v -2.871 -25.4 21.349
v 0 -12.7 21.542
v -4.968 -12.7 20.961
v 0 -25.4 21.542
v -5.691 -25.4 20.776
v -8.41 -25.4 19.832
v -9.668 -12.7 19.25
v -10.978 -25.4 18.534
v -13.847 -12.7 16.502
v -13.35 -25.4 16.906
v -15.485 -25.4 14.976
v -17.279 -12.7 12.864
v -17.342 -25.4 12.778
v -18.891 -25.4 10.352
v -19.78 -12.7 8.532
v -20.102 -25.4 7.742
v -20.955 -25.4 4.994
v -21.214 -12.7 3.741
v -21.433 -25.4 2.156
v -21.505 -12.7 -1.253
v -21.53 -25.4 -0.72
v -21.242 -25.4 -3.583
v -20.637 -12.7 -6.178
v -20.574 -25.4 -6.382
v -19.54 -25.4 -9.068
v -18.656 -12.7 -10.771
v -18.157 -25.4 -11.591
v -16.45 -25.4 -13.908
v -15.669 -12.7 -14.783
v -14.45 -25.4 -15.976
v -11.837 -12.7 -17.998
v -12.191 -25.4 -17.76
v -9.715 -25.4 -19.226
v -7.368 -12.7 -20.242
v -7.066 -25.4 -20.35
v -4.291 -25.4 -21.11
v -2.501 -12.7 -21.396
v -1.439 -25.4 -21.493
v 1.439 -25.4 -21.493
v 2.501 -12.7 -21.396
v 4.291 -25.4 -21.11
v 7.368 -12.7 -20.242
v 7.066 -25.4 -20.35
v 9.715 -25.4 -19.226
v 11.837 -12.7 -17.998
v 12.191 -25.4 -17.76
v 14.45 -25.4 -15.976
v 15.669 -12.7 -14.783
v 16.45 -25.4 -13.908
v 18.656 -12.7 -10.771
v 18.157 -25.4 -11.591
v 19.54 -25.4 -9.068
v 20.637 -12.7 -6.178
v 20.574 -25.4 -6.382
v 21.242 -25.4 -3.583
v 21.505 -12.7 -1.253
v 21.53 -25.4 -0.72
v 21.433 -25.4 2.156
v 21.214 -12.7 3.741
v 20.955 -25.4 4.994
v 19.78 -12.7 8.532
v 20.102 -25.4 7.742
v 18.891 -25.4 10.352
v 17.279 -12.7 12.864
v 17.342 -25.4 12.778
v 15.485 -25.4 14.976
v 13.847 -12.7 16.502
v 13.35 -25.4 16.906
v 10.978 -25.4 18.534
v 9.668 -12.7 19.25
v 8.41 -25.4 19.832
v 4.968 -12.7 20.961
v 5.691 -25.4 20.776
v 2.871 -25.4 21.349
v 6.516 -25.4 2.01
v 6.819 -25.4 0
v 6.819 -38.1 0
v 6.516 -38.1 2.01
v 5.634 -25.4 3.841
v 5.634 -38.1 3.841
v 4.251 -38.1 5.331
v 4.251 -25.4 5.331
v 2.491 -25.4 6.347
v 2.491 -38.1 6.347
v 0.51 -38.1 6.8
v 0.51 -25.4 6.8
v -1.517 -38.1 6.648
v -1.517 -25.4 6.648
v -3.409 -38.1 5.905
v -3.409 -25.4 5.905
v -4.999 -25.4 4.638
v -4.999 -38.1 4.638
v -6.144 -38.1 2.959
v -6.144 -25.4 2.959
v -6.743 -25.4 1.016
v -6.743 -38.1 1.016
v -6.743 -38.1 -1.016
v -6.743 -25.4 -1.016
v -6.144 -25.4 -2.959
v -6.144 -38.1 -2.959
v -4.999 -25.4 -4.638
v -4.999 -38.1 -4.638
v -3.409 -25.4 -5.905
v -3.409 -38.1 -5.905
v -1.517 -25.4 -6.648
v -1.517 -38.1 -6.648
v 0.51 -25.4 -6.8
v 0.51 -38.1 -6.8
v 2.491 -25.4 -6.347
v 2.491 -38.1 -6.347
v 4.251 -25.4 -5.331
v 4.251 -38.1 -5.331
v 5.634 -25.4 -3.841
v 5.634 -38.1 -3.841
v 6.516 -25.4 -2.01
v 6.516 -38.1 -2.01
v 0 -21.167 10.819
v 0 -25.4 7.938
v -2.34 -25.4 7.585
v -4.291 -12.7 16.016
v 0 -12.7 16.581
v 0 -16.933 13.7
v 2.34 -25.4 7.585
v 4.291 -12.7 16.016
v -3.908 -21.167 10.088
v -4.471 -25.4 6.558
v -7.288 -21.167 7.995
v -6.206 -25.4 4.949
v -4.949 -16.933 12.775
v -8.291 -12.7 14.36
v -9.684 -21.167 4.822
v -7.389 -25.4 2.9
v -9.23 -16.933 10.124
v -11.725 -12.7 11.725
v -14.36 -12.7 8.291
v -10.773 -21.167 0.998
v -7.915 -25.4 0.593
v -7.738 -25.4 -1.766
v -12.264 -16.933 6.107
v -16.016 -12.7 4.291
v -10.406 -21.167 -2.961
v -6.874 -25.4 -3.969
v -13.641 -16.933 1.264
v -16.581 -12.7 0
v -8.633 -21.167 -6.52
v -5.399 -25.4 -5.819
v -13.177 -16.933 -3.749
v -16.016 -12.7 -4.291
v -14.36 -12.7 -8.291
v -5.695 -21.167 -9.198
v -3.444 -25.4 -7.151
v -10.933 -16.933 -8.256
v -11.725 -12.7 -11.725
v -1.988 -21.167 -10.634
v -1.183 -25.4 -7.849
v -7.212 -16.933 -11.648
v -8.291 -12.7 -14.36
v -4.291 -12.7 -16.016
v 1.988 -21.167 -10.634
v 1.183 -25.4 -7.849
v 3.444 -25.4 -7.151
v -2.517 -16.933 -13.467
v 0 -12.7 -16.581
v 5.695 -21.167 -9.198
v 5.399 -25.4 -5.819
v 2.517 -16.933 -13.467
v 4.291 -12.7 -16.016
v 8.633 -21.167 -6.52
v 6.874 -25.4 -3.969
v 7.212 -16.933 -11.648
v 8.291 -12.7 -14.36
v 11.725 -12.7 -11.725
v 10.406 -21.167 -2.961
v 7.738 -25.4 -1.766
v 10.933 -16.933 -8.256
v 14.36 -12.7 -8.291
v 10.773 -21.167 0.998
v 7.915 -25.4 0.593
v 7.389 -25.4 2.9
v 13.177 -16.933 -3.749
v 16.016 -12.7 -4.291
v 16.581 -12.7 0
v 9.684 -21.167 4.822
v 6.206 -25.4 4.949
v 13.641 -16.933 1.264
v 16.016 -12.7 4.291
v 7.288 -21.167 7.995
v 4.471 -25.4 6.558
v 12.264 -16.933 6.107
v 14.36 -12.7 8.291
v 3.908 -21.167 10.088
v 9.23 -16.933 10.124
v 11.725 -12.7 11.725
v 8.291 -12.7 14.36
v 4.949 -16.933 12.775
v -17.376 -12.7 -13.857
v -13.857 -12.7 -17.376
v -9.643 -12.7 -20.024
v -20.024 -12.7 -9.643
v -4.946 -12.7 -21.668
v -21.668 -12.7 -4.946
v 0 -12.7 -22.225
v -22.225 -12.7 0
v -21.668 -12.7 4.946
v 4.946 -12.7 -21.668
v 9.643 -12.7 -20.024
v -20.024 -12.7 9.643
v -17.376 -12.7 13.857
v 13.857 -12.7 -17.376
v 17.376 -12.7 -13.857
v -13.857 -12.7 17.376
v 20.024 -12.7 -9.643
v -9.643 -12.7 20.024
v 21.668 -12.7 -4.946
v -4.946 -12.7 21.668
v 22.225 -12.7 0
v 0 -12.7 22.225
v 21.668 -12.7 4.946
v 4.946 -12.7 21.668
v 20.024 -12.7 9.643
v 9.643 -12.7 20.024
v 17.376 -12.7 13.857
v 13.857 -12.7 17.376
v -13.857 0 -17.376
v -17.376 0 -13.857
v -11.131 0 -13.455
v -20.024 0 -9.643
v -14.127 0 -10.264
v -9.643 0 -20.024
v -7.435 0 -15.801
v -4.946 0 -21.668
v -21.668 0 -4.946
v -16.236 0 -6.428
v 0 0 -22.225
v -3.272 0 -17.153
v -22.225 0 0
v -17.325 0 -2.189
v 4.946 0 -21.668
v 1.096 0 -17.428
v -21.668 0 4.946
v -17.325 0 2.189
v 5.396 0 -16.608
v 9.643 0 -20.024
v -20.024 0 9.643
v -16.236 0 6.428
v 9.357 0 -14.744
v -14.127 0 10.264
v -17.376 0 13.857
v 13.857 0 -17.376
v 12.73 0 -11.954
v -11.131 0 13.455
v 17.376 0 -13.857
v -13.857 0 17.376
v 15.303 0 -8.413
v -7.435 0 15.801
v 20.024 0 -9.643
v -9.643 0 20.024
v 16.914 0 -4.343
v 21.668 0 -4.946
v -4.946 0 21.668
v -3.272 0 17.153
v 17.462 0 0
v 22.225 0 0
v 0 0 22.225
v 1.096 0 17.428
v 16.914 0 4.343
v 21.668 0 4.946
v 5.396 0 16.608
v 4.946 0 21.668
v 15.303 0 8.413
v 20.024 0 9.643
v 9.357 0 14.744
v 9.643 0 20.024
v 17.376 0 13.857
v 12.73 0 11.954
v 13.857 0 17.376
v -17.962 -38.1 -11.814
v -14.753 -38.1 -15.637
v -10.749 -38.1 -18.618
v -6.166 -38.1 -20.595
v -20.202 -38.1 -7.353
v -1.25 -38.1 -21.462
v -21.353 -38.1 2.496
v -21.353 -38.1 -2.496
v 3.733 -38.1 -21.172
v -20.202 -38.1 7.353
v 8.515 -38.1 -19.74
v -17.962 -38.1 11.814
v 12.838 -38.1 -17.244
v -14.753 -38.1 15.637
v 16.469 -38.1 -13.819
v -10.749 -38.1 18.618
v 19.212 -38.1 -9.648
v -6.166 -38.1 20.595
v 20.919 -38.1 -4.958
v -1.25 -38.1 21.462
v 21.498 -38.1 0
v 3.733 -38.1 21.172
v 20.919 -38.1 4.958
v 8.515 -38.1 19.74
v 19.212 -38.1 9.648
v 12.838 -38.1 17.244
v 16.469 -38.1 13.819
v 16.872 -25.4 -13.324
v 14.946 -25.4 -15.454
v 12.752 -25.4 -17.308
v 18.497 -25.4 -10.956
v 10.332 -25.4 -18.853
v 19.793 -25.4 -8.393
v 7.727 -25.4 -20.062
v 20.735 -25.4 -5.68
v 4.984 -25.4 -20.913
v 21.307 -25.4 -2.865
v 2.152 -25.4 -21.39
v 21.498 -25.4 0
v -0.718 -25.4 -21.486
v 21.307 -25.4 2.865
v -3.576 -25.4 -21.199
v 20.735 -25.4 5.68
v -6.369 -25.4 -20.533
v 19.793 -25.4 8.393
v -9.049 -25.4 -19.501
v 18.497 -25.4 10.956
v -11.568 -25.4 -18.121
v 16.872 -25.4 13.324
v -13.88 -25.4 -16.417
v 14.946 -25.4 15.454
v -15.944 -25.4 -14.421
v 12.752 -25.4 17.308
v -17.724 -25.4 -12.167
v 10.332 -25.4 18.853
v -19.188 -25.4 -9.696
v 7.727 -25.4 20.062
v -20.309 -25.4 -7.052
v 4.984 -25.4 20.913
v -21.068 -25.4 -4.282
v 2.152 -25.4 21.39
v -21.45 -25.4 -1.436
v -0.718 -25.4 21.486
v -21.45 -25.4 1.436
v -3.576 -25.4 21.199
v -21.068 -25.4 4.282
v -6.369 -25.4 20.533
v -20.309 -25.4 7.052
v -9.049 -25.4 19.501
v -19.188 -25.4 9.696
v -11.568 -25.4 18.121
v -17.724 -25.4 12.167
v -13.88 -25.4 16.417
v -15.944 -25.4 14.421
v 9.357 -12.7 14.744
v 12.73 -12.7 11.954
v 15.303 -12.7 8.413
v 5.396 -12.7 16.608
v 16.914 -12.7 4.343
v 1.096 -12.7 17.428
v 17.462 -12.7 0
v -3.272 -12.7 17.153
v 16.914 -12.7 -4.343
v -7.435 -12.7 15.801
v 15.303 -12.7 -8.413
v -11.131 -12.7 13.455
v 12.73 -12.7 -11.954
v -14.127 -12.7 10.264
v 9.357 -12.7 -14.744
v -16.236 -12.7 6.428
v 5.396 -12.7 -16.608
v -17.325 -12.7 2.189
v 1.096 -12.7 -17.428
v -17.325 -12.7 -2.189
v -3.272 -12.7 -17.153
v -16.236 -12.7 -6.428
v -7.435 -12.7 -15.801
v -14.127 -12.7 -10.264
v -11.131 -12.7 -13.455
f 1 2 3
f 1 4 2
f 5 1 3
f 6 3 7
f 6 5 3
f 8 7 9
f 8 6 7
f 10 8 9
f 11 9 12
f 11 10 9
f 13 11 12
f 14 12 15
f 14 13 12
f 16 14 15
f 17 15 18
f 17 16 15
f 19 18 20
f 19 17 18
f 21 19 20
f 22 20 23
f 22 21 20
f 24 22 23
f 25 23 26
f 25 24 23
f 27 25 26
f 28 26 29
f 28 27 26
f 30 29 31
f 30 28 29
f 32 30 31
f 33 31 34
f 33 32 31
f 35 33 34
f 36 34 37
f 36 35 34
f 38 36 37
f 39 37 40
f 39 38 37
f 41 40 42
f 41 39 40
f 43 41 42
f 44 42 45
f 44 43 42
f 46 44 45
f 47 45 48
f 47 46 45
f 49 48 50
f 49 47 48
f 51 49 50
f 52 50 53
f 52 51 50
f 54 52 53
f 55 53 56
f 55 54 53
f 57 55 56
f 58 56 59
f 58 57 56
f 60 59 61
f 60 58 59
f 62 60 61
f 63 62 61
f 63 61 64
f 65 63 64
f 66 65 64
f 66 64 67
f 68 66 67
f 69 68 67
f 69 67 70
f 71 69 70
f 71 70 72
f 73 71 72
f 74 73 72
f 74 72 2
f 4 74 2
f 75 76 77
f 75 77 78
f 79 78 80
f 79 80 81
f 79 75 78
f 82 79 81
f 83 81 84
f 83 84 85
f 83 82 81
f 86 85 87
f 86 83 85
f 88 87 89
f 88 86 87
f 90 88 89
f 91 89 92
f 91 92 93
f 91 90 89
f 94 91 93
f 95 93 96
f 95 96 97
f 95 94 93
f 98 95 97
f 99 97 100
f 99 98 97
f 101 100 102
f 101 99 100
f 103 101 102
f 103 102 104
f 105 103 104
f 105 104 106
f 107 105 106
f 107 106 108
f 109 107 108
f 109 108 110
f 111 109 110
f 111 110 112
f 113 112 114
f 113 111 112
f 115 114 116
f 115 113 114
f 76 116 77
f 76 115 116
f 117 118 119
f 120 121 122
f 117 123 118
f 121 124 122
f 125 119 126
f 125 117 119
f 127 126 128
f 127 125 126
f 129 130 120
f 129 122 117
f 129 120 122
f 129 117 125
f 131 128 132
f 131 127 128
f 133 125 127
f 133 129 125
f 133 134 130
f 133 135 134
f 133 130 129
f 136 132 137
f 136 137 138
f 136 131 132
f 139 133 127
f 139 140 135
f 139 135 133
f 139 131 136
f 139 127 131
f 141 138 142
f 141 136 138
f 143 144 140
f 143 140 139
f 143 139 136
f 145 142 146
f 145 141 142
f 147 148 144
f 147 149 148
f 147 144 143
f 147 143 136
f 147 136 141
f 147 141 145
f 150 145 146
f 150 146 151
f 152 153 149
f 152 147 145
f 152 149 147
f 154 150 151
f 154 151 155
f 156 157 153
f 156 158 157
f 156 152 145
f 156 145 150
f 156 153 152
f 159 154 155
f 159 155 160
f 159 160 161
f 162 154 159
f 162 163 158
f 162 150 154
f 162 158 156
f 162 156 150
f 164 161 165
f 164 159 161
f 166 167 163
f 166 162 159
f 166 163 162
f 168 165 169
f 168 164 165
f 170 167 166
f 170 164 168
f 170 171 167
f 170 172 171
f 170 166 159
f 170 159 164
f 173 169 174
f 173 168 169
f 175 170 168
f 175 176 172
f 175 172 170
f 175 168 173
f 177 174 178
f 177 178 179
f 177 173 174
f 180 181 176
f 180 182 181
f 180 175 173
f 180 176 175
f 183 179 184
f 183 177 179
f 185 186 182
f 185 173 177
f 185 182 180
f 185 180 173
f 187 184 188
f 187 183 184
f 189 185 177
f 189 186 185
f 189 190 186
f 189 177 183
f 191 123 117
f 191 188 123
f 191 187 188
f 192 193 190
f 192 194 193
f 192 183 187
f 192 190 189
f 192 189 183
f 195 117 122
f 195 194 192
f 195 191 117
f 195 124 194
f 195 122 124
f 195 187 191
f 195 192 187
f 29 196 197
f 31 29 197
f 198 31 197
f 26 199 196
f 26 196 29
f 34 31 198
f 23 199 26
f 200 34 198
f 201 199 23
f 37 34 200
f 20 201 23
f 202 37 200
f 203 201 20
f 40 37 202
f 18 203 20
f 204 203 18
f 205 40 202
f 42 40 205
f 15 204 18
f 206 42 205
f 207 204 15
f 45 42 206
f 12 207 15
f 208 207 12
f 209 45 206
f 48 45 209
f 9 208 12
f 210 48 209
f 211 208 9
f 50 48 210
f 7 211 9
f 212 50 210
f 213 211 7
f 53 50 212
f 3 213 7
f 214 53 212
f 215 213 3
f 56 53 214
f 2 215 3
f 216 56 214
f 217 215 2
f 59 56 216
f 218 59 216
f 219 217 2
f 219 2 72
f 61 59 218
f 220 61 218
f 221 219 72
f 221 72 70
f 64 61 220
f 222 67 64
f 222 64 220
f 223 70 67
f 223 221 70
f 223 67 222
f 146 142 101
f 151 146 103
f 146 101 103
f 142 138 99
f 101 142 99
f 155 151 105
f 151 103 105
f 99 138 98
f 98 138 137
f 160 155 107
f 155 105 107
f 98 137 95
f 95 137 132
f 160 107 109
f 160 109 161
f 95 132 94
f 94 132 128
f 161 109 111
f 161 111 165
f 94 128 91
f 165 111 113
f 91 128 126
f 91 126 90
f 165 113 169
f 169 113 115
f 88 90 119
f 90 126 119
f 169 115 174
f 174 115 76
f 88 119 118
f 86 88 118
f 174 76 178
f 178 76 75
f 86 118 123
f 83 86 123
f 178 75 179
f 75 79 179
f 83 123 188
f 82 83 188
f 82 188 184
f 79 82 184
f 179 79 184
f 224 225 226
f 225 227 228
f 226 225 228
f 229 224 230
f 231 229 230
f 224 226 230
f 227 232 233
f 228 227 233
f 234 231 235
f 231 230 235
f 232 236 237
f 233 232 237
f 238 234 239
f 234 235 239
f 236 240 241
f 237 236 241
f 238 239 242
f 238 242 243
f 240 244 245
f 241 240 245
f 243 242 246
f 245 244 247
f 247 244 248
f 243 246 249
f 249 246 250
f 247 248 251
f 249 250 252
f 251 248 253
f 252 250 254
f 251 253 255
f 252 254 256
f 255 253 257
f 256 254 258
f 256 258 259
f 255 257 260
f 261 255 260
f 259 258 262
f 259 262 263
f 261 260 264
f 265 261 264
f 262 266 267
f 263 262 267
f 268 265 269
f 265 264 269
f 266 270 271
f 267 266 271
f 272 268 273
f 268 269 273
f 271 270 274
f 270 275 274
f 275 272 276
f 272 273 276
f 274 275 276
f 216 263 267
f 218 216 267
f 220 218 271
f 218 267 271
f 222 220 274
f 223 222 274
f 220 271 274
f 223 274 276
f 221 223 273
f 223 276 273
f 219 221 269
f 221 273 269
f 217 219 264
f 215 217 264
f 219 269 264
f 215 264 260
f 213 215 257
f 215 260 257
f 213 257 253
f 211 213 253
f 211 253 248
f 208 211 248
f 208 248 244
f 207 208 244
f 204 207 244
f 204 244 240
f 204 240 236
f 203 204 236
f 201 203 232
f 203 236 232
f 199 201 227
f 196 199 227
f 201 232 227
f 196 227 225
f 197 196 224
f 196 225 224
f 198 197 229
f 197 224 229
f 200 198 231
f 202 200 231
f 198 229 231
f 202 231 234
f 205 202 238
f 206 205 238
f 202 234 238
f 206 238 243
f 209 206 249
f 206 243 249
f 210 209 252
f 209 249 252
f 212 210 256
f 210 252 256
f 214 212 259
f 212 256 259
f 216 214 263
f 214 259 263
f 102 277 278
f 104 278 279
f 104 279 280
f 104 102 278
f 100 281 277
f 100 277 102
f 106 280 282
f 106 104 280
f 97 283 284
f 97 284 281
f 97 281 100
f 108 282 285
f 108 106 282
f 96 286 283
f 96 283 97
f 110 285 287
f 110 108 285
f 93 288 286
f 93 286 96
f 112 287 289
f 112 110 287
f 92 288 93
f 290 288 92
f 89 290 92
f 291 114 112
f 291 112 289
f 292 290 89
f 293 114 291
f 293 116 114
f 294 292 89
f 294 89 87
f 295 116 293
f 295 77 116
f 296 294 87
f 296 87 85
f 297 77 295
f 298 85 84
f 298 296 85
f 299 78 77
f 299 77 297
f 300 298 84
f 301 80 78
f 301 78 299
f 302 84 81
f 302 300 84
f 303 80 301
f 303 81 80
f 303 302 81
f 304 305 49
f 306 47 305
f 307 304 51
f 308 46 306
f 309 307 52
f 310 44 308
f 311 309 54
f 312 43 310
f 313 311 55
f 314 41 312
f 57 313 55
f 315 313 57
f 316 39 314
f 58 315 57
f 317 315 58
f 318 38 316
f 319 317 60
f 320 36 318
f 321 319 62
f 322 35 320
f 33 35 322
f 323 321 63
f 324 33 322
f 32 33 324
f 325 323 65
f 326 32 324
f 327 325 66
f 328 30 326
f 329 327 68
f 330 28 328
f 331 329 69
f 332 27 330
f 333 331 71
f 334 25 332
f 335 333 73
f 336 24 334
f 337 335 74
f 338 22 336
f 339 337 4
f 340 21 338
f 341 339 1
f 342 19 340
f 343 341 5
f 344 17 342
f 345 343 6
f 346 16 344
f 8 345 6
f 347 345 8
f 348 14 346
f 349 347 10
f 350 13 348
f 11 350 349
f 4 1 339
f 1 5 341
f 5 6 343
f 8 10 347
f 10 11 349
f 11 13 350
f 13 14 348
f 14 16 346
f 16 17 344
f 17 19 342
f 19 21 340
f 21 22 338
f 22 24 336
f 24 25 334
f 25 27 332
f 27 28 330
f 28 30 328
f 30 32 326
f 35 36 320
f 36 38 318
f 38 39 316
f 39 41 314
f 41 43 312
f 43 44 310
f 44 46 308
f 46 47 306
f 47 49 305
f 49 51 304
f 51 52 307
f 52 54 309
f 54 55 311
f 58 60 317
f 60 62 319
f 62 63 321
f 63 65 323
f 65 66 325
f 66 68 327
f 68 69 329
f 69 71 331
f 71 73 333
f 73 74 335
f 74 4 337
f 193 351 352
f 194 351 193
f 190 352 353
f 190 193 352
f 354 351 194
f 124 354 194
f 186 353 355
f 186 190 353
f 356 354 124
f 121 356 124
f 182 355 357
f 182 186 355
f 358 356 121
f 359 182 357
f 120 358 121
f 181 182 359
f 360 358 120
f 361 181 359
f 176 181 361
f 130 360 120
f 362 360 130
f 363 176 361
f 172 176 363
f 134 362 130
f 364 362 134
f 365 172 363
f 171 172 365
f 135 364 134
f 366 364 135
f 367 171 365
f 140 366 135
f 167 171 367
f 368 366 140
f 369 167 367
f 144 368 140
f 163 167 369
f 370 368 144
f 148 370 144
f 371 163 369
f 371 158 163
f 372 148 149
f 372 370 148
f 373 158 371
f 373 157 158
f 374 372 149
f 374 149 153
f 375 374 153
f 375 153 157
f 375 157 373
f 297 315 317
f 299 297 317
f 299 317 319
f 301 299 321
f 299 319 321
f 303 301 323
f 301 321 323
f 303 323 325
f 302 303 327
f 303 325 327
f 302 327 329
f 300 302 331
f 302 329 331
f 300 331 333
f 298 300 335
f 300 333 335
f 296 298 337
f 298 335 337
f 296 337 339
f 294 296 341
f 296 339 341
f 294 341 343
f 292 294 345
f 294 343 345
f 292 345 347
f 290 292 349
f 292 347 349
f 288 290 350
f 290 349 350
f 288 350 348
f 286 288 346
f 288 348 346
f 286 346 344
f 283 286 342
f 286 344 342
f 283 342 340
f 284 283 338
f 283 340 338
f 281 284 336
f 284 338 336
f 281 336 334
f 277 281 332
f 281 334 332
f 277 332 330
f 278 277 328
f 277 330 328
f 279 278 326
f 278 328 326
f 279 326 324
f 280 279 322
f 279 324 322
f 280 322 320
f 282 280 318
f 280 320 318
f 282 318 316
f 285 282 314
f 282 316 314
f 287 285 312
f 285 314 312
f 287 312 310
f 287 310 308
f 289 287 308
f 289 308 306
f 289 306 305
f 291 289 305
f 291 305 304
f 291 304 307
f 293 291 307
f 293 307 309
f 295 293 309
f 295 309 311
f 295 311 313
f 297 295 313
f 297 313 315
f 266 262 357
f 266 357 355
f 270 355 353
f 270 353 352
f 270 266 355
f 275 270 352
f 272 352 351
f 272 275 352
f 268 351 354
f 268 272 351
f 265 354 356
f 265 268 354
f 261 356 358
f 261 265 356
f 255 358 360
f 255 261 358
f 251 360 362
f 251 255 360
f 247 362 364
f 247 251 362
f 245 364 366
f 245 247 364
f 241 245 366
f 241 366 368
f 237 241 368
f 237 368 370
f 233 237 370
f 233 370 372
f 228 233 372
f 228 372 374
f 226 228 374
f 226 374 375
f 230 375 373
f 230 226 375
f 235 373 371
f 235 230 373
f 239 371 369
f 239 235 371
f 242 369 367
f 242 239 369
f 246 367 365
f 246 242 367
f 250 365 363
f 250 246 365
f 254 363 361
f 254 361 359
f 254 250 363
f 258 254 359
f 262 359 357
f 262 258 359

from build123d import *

# Parameters (mm, degrees)
F0_R     = 22.225
F0_R_2   = 17.4625
F1_DEPTH = 12.7
F4_R     = 21.498416
F4_R_2   = 6.818861
F5_DEPTH = 12.7


with BuildPart() as f1:
    # F0 (on Front) → F1 (new body)
    with BuildSketch(Plane.XZ):
        Circle(F0_R)
        Circle(F0_R_2, mode=Mode.SUBTRACT)
    extrude(amount=F1_DEPTH)

    # F2 (on Right) → F3 (revolve)
    with BuildSketch(Plane.YZ):
        Polygon((-25.4, 7.9375), (-12.7, 16.581038), (-12.7, 21.541582), (-25.4, 21.541582), align=None)
    revolve(axis=Axis((0, -12.7, 0), (0, -1, 0)))

    # F4 (on face) → F5 (join)
    with BuildSketch(Plane.XZ.offset(25.4)):
        Circle(F4_R)
        Circle(F4_R_2, mode=Mode.SUBTRACT)
    extrude(amount=F5_DEPTH)


solid = f1.part
